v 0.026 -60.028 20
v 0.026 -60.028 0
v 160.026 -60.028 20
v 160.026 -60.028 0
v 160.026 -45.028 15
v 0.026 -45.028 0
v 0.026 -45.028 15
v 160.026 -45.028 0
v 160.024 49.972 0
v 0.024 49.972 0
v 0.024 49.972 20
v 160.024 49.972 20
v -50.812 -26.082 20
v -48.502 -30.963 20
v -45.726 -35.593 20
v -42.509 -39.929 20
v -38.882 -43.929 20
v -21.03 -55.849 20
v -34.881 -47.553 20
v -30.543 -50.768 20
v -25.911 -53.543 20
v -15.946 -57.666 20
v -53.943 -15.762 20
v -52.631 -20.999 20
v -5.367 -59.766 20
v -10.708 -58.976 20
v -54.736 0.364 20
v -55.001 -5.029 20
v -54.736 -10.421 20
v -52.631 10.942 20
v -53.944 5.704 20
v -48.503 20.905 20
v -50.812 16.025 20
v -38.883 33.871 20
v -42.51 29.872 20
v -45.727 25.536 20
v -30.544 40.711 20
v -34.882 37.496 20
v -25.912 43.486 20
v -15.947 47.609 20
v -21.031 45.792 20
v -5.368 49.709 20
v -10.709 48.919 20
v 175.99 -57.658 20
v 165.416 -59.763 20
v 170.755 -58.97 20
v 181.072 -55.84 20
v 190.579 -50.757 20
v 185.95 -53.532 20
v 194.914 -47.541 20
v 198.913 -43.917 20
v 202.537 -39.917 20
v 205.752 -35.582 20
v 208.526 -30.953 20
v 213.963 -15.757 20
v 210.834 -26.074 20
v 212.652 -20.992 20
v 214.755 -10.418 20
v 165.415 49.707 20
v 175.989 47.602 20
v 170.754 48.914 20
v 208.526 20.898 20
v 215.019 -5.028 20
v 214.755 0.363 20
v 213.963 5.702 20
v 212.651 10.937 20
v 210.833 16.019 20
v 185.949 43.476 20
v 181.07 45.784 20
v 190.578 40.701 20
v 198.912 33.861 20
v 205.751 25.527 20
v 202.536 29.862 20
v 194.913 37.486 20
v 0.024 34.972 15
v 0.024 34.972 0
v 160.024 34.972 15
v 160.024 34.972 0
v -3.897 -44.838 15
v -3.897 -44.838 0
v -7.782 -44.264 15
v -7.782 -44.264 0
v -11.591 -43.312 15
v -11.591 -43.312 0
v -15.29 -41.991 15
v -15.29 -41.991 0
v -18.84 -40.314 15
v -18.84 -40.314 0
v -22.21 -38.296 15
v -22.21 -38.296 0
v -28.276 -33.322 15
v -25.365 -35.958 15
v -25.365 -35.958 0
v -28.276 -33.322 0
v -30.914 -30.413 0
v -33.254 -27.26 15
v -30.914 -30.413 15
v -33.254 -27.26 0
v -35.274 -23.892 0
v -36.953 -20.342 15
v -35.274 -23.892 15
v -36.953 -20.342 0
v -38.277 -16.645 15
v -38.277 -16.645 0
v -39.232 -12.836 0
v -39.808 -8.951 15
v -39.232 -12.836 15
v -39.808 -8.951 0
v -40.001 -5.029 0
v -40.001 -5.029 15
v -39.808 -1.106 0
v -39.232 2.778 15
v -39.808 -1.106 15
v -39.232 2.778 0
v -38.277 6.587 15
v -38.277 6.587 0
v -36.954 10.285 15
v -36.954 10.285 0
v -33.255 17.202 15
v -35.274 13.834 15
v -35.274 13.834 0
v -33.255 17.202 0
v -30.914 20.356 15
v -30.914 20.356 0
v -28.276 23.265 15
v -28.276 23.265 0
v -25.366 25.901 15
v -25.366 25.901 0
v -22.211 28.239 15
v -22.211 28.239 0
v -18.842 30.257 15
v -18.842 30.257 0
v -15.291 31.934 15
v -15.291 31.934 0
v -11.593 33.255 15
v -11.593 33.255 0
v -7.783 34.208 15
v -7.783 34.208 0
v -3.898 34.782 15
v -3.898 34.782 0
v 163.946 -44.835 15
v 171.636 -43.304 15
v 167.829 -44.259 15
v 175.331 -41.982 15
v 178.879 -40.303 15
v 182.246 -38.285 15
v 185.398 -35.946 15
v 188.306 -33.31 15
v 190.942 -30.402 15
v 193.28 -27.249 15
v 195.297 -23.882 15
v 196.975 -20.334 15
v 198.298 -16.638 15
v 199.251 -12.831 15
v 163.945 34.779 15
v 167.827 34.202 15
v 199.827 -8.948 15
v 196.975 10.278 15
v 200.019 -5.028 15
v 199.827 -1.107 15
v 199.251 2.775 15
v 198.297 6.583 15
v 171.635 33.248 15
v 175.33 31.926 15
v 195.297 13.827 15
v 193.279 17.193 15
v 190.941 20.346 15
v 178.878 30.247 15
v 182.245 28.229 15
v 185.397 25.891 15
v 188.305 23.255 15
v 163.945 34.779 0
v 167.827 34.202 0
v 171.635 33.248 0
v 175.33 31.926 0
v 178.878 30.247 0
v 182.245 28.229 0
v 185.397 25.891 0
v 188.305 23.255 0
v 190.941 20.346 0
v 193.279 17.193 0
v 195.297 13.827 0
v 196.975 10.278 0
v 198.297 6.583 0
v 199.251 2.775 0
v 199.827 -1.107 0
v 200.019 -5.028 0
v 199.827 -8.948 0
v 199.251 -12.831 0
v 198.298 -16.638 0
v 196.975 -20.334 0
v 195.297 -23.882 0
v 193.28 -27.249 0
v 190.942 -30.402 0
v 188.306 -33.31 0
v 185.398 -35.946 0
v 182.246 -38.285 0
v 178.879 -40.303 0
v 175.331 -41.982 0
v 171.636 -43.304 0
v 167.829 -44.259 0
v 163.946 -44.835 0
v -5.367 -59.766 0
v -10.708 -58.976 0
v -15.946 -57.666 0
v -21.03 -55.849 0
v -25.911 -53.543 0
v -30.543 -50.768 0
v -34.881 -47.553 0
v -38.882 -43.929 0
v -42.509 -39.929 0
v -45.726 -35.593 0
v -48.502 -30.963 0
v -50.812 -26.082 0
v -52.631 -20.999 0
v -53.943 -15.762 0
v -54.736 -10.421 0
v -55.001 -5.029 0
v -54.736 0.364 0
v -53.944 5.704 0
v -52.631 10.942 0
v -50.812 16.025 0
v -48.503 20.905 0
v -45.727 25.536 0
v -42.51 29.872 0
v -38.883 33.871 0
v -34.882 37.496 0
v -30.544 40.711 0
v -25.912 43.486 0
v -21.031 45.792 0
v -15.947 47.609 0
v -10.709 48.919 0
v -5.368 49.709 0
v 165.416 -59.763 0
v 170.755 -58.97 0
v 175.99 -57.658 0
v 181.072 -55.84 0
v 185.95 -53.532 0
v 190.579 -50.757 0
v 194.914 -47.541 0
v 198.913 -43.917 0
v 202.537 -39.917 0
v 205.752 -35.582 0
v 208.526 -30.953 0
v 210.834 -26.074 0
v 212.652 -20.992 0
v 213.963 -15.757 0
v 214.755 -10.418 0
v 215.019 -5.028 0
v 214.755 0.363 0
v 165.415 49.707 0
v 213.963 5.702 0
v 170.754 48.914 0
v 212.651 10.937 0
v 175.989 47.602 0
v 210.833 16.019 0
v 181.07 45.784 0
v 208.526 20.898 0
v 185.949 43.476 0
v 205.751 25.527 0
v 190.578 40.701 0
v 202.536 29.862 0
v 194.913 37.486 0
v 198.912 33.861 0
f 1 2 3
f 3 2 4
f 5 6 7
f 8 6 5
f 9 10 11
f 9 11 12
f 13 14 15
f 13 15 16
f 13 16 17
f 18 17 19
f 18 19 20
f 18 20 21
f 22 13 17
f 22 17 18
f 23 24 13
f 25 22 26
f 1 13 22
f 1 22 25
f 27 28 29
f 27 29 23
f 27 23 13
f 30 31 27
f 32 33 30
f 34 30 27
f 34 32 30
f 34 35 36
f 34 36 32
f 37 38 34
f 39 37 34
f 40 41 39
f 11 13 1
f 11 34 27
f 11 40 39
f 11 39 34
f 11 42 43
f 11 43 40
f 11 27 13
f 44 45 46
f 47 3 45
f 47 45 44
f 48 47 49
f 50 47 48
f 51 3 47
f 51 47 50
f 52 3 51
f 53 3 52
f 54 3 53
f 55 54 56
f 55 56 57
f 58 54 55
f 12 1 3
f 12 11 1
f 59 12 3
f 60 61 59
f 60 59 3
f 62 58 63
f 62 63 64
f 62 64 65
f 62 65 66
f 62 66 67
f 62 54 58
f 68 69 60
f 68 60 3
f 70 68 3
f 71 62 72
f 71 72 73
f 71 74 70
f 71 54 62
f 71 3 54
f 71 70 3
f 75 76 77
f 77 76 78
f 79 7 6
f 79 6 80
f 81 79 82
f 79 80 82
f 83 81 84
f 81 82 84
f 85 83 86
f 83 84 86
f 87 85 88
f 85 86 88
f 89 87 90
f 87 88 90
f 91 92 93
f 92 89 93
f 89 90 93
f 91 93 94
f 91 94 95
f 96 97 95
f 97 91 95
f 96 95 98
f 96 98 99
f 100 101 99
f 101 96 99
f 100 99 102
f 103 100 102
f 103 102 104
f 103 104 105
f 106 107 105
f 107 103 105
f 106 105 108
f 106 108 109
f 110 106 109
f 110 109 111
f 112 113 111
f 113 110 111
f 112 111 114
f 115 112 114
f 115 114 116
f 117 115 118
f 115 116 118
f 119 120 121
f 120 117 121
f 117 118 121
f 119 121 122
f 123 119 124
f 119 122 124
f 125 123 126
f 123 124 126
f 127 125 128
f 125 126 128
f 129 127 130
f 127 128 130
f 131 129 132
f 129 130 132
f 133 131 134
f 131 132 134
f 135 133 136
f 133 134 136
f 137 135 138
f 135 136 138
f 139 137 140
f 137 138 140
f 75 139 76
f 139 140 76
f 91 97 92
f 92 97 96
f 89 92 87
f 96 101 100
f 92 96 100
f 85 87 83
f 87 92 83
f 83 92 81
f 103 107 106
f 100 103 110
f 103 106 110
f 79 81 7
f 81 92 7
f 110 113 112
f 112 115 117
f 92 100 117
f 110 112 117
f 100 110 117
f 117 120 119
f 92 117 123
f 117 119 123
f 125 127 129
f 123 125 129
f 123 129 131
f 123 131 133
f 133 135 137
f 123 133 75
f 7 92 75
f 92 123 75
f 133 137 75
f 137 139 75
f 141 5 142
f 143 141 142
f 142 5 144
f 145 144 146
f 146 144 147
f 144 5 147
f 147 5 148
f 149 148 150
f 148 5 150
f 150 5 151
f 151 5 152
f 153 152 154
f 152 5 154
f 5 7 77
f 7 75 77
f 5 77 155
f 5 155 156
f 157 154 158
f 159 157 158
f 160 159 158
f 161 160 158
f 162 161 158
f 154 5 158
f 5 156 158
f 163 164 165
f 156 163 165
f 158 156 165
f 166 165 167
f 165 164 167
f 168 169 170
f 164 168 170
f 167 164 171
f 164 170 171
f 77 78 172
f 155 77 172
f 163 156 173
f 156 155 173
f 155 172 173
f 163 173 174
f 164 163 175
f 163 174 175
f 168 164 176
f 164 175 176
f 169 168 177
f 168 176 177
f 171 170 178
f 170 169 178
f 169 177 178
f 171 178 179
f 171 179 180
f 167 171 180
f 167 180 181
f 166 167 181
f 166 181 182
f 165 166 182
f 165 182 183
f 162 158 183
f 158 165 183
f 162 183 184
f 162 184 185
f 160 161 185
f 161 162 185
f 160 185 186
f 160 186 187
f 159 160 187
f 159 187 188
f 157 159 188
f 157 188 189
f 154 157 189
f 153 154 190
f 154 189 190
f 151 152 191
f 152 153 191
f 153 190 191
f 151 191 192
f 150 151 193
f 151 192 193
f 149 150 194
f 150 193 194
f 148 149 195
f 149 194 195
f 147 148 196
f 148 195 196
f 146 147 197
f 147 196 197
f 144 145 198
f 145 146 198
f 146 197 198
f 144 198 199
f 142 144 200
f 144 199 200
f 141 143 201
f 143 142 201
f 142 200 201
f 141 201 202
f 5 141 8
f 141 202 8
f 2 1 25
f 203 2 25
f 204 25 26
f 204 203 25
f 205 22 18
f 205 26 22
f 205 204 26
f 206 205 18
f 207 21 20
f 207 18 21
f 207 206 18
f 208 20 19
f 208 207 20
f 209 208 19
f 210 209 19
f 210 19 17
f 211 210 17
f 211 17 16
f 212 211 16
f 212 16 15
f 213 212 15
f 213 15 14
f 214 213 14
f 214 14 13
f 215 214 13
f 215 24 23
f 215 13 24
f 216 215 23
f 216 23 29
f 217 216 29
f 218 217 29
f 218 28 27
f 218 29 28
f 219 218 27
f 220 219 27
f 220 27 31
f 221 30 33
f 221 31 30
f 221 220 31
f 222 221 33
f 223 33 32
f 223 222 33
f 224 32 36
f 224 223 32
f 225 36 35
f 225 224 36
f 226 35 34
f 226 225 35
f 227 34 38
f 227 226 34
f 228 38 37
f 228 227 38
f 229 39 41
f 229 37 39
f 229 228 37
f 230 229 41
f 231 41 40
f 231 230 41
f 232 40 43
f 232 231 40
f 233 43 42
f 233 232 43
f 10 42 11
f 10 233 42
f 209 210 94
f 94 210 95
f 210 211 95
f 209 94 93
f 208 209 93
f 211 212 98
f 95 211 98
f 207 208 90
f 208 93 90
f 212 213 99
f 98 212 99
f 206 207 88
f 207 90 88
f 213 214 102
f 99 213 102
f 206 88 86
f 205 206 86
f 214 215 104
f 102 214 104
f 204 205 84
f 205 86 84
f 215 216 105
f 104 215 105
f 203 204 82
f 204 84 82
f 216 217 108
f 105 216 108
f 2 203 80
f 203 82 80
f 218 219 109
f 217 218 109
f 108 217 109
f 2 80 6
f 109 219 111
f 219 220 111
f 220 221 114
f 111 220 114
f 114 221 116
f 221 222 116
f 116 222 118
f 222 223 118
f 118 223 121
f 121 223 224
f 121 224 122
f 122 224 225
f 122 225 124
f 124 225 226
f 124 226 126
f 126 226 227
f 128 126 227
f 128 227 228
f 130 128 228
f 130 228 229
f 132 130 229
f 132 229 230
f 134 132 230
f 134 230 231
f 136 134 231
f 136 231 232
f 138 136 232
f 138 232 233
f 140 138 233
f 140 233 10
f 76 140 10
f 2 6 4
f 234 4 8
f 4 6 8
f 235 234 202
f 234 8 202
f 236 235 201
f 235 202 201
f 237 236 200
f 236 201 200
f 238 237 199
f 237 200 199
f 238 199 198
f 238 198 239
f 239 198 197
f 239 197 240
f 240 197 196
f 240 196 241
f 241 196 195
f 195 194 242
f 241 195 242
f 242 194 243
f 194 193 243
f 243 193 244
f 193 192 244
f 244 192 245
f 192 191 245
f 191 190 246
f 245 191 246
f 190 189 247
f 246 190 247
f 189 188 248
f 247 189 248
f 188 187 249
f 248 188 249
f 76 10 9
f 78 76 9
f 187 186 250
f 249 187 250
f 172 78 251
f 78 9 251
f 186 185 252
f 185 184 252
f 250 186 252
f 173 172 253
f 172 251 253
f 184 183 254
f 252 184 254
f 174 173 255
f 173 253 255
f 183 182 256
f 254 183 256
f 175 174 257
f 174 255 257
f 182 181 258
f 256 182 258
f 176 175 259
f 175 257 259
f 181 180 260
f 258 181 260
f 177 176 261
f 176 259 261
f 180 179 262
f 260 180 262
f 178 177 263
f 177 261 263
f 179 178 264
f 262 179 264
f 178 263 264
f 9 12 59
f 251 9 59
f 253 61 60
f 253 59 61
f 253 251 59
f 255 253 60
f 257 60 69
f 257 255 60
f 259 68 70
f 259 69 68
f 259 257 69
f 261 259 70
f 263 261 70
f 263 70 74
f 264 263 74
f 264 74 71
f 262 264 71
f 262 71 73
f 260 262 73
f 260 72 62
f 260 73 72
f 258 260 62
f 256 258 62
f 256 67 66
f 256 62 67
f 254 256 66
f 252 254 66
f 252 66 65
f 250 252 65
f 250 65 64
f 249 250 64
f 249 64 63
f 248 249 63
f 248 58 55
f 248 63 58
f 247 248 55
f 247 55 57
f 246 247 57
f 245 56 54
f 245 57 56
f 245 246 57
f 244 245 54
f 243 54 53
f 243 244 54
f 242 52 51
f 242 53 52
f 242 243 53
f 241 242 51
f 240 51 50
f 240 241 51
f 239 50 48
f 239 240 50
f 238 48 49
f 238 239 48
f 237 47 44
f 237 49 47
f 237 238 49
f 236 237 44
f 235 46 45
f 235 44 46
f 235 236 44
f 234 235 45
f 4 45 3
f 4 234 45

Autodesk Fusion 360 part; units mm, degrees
sketch "Sketch1" plane through (0, 0, 0) normal (0, 0, 1) x (1, 0, 0)
  line L0 (0.0245, 49.9718) -> (160.0245, 49.9718)
  line L1 (0.0257, -60.0282) -> (160.0257, -60.0282)
  arc A0 (0.0245, 49.9718) -> (0.0257, -60.0282) centre (-0.0009, -5.0282) ccw
  arc A1 (160.0257, -60.0282) -> (160.0245, 49.9718) centre (160.0195, -5.0282) ccw
  line L2 (80.0245, 49.9718) -> (80.0245, 34.9718) construction
  line L3 (0.0245, 34.9718) -> (160.0245, 34.9718)
  line L4 (80.0257, -60.0282) -> (80.0257, -45.0282) construction
  line L5 (0.0257, -45.0282) -> (160.0257, -45.0282)
  line L6 (160.0245, 49.9718) -> (160.0245, 34.9718) construction
  line L7 (160.0257, -60.0282) -> (160.0257, -45.0282) construction
  arc A2 (0.0245, 34.9718) -> (0.0257, -45.0282) centre (-0.0009, -5.0282) ccw
  arc A3 (160.0141, -45.0282) -> (160.0152, 34.9718) centre (160.0195, -5.0282) ccw
  dimension "d3" = 160
  dimension "d5" = 110
  dimension "d6" = 160
  dimension "d7" = 110
  dimension "d8" = 15
  dimension "d9" = 160
  dimension "d10" = 15
  dimension "d11" = 160
  dimension "d12" = 15
  dimension "d13" = 15
  dimension "d14" = 80
  dimension "d15" = 80
extrude "Extrude1" add sketch "Sketch1" along normal blind 20 contours L0 L1 A0 A1 | L3 L5 A2 A3
extrude "Extrude2" cut sketch "Sketch1" along normal blind 15 contours L3 L5 A2 A3
equation "length = 160 mm"
equation "width = 110 mm"
equation "d3 = length"
equation "thickness = 15 mm"
equation "d5 = width"
equation "d6 = length"
equation "d7 = width"
equation "d8 = thickness"
equation "d9 = length"
equation "d10 = thickness"
equation "d11 = length"
equation "d12 = thickness"
equation "d13 = thickness"
equation "d14 = width - thickness * 2"
equation "d15 = width - thickness * 2"
equation "o_extrude = 20 mm"
equation "i_extrude = 15 mm"
equation "d18 = o_extrude"
equation "d20 = i_extrude"
